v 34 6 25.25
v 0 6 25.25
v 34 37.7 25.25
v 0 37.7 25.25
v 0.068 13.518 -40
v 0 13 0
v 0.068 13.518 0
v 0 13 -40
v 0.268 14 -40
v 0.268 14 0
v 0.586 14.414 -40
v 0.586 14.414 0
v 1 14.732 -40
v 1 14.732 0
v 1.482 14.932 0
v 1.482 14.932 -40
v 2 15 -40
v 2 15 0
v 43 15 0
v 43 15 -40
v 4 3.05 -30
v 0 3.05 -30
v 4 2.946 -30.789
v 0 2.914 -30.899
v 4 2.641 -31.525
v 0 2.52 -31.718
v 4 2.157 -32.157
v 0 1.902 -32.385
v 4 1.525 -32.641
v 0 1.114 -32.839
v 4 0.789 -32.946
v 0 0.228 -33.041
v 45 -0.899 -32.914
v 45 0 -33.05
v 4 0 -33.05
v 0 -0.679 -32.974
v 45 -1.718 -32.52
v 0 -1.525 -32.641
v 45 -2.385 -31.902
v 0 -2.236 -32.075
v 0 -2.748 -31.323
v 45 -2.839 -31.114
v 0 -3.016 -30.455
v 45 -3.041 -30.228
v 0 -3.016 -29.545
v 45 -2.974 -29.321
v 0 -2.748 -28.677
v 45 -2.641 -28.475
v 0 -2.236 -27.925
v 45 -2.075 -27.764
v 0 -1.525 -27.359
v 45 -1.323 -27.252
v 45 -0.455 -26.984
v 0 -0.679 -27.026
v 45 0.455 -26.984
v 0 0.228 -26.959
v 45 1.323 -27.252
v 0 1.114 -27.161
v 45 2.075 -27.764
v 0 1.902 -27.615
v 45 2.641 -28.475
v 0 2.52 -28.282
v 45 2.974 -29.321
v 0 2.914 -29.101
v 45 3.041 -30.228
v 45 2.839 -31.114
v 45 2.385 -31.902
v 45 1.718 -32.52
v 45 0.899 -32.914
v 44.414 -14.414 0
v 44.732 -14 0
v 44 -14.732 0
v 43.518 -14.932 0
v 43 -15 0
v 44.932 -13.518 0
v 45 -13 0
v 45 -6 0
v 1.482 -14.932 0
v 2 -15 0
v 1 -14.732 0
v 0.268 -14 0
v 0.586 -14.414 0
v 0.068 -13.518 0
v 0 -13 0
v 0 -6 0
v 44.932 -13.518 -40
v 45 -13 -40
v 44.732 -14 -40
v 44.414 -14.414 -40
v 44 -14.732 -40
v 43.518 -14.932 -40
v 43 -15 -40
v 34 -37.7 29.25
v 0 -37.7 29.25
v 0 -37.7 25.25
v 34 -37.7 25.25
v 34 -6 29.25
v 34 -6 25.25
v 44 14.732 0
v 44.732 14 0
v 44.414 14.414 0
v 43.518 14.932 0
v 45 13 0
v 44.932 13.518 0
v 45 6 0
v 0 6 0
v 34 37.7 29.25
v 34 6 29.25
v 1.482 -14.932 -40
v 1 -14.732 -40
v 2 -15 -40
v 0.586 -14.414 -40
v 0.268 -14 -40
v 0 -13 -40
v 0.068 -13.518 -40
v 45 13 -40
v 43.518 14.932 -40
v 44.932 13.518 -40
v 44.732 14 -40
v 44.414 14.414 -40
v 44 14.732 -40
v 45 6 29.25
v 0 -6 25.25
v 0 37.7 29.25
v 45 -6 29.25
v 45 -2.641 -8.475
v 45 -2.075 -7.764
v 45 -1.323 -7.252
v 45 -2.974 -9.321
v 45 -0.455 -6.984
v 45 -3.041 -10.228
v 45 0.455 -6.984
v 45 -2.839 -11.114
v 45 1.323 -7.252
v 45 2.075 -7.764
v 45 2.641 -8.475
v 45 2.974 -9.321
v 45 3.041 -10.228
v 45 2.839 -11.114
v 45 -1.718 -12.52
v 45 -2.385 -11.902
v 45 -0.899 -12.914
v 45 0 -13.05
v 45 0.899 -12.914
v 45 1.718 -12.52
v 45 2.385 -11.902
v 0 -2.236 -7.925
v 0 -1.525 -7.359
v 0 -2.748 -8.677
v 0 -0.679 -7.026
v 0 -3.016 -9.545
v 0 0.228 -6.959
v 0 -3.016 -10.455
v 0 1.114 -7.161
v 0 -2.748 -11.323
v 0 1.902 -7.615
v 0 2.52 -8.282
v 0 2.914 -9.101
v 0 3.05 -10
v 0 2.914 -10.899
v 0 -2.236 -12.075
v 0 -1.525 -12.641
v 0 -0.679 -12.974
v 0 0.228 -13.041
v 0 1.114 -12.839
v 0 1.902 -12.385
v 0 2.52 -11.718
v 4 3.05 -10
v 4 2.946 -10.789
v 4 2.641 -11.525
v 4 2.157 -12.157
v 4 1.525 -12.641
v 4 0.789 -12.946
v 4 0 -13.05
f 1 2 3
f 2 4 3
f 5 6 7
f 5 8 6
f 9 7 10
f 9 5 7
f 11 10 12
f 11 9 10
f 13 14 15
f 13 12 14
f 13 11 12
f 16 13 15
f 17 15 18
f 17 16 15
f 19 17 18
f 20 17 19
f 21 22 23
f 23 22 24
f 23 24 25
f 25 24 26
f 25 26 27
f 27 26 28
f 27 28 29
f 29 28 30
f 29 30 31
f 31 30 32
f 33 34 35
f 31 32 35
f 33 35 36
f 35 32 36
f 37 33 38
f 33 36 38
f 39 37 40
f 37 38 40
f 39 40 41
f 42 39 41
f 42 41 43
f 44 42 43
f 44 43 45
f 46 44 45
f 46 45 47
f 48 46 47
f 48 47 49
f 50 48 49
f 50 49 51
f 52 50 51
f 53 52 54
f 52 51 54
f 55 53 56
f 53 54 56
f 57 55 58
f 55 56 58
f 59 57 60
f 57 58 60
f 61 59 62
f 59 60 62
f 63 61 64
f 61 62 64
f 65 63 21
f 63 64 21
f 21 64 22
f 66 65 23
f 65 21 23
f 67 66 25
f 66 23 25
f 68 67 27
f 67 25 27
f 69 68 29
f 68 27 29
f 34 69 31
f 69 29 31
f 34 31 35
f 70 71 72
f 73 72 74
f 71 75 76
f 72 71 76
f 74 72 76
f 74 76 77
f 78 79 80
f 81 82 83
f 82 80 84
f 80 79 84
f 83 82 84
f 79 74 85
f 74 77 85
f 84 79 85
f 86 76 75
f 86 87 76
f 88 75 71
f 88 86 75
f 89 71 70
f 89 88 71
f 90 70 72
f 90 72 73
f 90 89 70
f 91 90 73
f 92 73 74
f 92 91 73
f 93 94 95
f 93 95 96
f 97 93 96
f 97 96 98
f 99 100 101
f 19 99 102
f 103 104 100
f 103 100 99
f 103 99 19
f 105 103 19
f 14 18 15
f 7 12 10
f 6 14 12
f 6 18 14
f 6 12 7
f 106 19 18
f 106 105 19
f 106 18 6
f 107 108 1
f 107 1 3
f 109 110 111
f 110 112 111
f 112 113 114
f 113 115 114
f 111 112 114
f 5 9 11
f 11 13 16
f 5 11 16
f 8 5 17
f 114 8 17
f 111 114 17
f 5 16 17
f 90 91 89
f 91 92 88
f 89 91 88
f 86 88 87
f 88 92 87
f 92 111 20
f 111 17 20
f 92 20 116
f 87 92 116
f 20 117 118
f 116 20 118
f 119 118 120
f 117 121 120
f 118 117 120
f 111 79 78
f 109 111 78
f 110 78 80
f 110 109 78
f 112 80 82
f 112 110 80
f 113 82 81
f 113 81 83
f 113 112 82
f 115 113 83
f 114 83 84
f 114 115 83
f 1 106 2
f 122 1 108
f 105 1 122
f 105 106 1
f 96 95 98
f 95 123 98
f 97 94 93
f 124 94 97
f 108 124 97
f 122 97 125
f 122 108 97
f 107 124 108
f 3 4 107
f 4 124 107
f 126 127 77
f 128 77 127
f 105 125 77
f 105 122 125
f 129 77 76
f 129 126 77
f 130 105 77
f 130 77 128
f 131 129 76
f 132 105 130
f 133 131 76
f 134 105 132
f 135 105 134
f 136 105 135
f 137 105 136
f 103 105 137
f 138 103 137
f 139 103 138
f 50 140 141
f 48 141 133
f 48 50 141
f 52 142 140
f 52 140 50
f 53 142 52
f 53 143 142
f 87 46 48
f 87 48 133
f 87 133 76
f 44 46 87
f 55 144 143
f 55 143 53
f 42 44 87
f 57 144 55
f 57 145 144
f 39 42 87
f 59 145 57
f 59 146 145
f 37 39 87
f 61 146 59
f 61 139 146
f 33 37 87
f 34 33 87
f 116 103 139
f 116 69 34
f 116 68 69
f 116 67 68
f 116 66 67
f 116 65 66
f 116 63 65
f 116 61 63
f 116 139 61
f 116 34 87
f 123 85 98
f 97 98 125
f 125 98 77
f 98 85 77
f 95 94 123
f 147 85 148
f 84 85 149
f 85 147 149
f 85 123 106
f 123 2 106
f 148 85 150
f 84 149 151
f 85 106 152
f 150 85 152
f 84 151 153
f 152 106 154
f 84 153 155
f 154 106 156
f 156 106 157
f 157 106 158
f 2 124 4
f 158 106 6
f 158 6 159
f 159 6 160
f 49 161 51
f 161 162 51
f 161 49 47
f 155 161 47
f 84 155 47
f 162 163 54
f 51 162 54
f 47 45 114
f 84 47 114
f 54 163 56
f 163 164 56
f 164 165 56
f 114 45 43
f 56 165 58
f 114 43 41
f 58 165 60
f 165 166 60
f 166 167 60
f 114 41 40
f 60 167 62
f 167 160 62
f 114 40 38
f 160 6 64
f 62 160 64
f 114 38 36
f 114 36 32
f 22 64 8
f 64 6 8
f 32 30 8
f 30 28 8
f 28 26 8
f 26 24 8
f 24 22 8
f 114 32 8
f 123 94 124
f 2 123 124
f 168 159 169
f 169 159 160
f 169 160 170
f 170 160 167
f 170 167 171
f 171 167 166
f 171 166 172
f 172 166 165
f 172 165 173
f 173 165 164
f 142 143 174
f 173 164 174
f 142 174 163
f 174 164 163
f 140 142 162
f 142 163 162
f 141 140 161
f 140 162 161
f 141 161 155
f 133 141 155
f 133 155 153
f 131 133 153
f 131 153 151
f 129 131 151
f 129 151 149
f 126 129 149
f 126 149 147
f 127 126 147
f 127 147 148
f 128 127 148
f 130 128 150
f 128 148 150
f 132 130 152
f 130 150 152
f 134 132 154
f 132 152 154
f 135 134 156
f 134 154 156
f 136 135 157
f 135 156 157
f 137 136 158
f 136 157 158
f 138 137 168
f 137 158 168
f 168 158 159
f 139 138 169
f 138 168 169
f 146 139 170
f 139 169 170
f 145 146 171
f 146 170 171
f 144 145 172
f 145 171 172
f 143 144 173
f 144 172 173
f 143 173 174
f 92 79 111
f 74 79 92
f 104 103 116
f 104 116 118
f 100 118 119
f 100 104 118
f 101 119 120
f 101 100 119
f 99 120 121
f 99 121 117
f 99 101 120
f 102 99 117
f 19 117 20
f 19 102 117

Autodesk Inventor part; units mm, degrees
ref_plane "YZ Plane" through (0, 0, 0) normal (1, 0, 0) x (0, 1, 0)
ref_plane "XZ Plane" through (0, 0, 0) normal (0, 1, 0) x (-1, 0, 0)
ref_plane "XY Plane" through (0, 0, 0) normal (0, 0, 1) x (1, 0, 0)
sketch "Sketch1" plane through (0, 0, 0) normal (1, 0, 0) x (0, 1, 0)
  circle A0 centre (0, -10) radius 3.05
  circle A1 centre (0, -30) radius 3.05
  line L0 (0, 0) -> (6, 0)
  line L1 (6, 0) -> (6, -40)
  line L2 (6, -40) -> (-6, -40)
  line L3 (-6, -40) -> (-6, 0)
  line L4 (-6, 0) -> (0, 0)
  line L5 (6, 0) -> (-6, 0)
extrude "Extrusion1" add sketch "Sketch1" along normal blind 4
sketch "Sketch2" plane through (0, -6, 0) normal (0, 0, 1) x (1, 0, 0)
  line L0 (0, 12) -> (0, 0) projected
  line L1 (0, 0) -> (4, 0) projected
  line L2 (4, 12) -> (4, 0) projected
  line L3 (0, 12) -> (4, 12) projected
  point P0 (0, 6)
extrude "Extrusion2" add sketch "Sketch2" along normal blind 29.25
sketch "Sketch3" plane through (0, -6, 29.25) normal (0, 0, 1) x (1, 0, 0)
  line L0 (0, 0) -> (0, 12) projected
  line L1 (0, 12) -> (0, 43.7)
  line L2 (0, 0) -> (4, 0) projected
  line L3 (0, 0) -> (0, -31.7)
  line L4 (0, 43.7) -> (34, 43.7)
  line L5 (0, -31.7) -> (34, -31.7)
  line L6 (34, -31.7) -> (34, 43.7)
  line L7 (0, 12) -> (0, 0) projected
  line L8 (0, 0) -> (4, 0) projected
  line L9 (4, 0) -> (4, 12) projected
  line L10 (4, 12) -> (0, 12) projected
  point P0 (0, 6)
  dimension "d12" = 31.7
  dimension "d13" = 31.7
  dimension "d14" = 34
  dimension "d15" = 34
extrude "Extrusion3" add sketch "Sketch3" against normal blind 4 contours L2 L9 L10 L1 L4 L6 L5 L3
sketch "Sketch4" plane through (4, 0, 0) normal (1, 0, 0) x (0, 0, -1)
  line L0 (-25.25, 6) -> (-25.25, -6) projected
  line L1 (40, -6) -> (-25.25, -6) projected
  line L2 (40, -6) -> (40, 6) projected
  line L3 (40, 6) -> (-25.25, 6) projected
  circle A0 centre (10, 0) radius 3.05 projected
  circle A1 centre (30, 0) radius 3.05 projected
  point P0 (0, 0)
extrude "Extrusion4" add sketch "Sketch4" along normal blind 41
sketch "Sketch5" plane through (34, -6, 25.25) normal (0, 0, 1) x (1, 0, 0)
  line L0 (0, 12) -> (0, 0) projected
  line L1 (0, 0) -> (11, 0) projected
  line L2 (11, 12) -> (11, 0) projected
  line L3 (0, 12) -> (11, 12) projected
  point P0 (-34, 6)
extrude "Extrusion5" add sketch "Sketch5" along normal up to surface (4 mm away)
sketch "Sketch6" plane through (0, 6, 25.25) normal (0, 1, 0) x (1, 0, 0)
  line L0 (45, 65.25) -> (45, -4) projected
  line L1 (45, 65.25) -> (45, 25.25)
  line L2 (45, 25.25) -> (0, 25.25)
  line L3 (0, 65.25) -> (45, 65.25) projected
  line L4 (0, 25.25) -> (0, 65.25)
  line L5 (0, 65.25) -> (45, 65.25)
  dimension "d23" = 40
extrude "Extrusion6" add sketch "Sketch6" along normal blind 9
fillet "Fillet2" radius 2 2 edges at (0, 15, -20) (45, 15, -20)
sketch "Sketch7" plane through (0, -6, 25.25) normal (0, -1, 0) x (1, 0, 0)
  line L0 (45, -25.25) -> (45, -65.25) projected
  line L1 (45, -65.25) -> (45, -25.25)
  line L2 (45, -25.25) -> (0, -25.25) projected
  line L3 (45, -25.25) -> (0, -25.25)
  line L4 (0, -25.25) -> (0, -65.25)
  line L5 (0, -65.25) -> (45, -65.25)
extrude "Extrusion7" add sketch "Sketch7" along normal blind 9
fillet "Fillet3" radius 2 2 edges at (45, -15, -20) (0, -15, -20)
properties part number "din_lamp_connector"
